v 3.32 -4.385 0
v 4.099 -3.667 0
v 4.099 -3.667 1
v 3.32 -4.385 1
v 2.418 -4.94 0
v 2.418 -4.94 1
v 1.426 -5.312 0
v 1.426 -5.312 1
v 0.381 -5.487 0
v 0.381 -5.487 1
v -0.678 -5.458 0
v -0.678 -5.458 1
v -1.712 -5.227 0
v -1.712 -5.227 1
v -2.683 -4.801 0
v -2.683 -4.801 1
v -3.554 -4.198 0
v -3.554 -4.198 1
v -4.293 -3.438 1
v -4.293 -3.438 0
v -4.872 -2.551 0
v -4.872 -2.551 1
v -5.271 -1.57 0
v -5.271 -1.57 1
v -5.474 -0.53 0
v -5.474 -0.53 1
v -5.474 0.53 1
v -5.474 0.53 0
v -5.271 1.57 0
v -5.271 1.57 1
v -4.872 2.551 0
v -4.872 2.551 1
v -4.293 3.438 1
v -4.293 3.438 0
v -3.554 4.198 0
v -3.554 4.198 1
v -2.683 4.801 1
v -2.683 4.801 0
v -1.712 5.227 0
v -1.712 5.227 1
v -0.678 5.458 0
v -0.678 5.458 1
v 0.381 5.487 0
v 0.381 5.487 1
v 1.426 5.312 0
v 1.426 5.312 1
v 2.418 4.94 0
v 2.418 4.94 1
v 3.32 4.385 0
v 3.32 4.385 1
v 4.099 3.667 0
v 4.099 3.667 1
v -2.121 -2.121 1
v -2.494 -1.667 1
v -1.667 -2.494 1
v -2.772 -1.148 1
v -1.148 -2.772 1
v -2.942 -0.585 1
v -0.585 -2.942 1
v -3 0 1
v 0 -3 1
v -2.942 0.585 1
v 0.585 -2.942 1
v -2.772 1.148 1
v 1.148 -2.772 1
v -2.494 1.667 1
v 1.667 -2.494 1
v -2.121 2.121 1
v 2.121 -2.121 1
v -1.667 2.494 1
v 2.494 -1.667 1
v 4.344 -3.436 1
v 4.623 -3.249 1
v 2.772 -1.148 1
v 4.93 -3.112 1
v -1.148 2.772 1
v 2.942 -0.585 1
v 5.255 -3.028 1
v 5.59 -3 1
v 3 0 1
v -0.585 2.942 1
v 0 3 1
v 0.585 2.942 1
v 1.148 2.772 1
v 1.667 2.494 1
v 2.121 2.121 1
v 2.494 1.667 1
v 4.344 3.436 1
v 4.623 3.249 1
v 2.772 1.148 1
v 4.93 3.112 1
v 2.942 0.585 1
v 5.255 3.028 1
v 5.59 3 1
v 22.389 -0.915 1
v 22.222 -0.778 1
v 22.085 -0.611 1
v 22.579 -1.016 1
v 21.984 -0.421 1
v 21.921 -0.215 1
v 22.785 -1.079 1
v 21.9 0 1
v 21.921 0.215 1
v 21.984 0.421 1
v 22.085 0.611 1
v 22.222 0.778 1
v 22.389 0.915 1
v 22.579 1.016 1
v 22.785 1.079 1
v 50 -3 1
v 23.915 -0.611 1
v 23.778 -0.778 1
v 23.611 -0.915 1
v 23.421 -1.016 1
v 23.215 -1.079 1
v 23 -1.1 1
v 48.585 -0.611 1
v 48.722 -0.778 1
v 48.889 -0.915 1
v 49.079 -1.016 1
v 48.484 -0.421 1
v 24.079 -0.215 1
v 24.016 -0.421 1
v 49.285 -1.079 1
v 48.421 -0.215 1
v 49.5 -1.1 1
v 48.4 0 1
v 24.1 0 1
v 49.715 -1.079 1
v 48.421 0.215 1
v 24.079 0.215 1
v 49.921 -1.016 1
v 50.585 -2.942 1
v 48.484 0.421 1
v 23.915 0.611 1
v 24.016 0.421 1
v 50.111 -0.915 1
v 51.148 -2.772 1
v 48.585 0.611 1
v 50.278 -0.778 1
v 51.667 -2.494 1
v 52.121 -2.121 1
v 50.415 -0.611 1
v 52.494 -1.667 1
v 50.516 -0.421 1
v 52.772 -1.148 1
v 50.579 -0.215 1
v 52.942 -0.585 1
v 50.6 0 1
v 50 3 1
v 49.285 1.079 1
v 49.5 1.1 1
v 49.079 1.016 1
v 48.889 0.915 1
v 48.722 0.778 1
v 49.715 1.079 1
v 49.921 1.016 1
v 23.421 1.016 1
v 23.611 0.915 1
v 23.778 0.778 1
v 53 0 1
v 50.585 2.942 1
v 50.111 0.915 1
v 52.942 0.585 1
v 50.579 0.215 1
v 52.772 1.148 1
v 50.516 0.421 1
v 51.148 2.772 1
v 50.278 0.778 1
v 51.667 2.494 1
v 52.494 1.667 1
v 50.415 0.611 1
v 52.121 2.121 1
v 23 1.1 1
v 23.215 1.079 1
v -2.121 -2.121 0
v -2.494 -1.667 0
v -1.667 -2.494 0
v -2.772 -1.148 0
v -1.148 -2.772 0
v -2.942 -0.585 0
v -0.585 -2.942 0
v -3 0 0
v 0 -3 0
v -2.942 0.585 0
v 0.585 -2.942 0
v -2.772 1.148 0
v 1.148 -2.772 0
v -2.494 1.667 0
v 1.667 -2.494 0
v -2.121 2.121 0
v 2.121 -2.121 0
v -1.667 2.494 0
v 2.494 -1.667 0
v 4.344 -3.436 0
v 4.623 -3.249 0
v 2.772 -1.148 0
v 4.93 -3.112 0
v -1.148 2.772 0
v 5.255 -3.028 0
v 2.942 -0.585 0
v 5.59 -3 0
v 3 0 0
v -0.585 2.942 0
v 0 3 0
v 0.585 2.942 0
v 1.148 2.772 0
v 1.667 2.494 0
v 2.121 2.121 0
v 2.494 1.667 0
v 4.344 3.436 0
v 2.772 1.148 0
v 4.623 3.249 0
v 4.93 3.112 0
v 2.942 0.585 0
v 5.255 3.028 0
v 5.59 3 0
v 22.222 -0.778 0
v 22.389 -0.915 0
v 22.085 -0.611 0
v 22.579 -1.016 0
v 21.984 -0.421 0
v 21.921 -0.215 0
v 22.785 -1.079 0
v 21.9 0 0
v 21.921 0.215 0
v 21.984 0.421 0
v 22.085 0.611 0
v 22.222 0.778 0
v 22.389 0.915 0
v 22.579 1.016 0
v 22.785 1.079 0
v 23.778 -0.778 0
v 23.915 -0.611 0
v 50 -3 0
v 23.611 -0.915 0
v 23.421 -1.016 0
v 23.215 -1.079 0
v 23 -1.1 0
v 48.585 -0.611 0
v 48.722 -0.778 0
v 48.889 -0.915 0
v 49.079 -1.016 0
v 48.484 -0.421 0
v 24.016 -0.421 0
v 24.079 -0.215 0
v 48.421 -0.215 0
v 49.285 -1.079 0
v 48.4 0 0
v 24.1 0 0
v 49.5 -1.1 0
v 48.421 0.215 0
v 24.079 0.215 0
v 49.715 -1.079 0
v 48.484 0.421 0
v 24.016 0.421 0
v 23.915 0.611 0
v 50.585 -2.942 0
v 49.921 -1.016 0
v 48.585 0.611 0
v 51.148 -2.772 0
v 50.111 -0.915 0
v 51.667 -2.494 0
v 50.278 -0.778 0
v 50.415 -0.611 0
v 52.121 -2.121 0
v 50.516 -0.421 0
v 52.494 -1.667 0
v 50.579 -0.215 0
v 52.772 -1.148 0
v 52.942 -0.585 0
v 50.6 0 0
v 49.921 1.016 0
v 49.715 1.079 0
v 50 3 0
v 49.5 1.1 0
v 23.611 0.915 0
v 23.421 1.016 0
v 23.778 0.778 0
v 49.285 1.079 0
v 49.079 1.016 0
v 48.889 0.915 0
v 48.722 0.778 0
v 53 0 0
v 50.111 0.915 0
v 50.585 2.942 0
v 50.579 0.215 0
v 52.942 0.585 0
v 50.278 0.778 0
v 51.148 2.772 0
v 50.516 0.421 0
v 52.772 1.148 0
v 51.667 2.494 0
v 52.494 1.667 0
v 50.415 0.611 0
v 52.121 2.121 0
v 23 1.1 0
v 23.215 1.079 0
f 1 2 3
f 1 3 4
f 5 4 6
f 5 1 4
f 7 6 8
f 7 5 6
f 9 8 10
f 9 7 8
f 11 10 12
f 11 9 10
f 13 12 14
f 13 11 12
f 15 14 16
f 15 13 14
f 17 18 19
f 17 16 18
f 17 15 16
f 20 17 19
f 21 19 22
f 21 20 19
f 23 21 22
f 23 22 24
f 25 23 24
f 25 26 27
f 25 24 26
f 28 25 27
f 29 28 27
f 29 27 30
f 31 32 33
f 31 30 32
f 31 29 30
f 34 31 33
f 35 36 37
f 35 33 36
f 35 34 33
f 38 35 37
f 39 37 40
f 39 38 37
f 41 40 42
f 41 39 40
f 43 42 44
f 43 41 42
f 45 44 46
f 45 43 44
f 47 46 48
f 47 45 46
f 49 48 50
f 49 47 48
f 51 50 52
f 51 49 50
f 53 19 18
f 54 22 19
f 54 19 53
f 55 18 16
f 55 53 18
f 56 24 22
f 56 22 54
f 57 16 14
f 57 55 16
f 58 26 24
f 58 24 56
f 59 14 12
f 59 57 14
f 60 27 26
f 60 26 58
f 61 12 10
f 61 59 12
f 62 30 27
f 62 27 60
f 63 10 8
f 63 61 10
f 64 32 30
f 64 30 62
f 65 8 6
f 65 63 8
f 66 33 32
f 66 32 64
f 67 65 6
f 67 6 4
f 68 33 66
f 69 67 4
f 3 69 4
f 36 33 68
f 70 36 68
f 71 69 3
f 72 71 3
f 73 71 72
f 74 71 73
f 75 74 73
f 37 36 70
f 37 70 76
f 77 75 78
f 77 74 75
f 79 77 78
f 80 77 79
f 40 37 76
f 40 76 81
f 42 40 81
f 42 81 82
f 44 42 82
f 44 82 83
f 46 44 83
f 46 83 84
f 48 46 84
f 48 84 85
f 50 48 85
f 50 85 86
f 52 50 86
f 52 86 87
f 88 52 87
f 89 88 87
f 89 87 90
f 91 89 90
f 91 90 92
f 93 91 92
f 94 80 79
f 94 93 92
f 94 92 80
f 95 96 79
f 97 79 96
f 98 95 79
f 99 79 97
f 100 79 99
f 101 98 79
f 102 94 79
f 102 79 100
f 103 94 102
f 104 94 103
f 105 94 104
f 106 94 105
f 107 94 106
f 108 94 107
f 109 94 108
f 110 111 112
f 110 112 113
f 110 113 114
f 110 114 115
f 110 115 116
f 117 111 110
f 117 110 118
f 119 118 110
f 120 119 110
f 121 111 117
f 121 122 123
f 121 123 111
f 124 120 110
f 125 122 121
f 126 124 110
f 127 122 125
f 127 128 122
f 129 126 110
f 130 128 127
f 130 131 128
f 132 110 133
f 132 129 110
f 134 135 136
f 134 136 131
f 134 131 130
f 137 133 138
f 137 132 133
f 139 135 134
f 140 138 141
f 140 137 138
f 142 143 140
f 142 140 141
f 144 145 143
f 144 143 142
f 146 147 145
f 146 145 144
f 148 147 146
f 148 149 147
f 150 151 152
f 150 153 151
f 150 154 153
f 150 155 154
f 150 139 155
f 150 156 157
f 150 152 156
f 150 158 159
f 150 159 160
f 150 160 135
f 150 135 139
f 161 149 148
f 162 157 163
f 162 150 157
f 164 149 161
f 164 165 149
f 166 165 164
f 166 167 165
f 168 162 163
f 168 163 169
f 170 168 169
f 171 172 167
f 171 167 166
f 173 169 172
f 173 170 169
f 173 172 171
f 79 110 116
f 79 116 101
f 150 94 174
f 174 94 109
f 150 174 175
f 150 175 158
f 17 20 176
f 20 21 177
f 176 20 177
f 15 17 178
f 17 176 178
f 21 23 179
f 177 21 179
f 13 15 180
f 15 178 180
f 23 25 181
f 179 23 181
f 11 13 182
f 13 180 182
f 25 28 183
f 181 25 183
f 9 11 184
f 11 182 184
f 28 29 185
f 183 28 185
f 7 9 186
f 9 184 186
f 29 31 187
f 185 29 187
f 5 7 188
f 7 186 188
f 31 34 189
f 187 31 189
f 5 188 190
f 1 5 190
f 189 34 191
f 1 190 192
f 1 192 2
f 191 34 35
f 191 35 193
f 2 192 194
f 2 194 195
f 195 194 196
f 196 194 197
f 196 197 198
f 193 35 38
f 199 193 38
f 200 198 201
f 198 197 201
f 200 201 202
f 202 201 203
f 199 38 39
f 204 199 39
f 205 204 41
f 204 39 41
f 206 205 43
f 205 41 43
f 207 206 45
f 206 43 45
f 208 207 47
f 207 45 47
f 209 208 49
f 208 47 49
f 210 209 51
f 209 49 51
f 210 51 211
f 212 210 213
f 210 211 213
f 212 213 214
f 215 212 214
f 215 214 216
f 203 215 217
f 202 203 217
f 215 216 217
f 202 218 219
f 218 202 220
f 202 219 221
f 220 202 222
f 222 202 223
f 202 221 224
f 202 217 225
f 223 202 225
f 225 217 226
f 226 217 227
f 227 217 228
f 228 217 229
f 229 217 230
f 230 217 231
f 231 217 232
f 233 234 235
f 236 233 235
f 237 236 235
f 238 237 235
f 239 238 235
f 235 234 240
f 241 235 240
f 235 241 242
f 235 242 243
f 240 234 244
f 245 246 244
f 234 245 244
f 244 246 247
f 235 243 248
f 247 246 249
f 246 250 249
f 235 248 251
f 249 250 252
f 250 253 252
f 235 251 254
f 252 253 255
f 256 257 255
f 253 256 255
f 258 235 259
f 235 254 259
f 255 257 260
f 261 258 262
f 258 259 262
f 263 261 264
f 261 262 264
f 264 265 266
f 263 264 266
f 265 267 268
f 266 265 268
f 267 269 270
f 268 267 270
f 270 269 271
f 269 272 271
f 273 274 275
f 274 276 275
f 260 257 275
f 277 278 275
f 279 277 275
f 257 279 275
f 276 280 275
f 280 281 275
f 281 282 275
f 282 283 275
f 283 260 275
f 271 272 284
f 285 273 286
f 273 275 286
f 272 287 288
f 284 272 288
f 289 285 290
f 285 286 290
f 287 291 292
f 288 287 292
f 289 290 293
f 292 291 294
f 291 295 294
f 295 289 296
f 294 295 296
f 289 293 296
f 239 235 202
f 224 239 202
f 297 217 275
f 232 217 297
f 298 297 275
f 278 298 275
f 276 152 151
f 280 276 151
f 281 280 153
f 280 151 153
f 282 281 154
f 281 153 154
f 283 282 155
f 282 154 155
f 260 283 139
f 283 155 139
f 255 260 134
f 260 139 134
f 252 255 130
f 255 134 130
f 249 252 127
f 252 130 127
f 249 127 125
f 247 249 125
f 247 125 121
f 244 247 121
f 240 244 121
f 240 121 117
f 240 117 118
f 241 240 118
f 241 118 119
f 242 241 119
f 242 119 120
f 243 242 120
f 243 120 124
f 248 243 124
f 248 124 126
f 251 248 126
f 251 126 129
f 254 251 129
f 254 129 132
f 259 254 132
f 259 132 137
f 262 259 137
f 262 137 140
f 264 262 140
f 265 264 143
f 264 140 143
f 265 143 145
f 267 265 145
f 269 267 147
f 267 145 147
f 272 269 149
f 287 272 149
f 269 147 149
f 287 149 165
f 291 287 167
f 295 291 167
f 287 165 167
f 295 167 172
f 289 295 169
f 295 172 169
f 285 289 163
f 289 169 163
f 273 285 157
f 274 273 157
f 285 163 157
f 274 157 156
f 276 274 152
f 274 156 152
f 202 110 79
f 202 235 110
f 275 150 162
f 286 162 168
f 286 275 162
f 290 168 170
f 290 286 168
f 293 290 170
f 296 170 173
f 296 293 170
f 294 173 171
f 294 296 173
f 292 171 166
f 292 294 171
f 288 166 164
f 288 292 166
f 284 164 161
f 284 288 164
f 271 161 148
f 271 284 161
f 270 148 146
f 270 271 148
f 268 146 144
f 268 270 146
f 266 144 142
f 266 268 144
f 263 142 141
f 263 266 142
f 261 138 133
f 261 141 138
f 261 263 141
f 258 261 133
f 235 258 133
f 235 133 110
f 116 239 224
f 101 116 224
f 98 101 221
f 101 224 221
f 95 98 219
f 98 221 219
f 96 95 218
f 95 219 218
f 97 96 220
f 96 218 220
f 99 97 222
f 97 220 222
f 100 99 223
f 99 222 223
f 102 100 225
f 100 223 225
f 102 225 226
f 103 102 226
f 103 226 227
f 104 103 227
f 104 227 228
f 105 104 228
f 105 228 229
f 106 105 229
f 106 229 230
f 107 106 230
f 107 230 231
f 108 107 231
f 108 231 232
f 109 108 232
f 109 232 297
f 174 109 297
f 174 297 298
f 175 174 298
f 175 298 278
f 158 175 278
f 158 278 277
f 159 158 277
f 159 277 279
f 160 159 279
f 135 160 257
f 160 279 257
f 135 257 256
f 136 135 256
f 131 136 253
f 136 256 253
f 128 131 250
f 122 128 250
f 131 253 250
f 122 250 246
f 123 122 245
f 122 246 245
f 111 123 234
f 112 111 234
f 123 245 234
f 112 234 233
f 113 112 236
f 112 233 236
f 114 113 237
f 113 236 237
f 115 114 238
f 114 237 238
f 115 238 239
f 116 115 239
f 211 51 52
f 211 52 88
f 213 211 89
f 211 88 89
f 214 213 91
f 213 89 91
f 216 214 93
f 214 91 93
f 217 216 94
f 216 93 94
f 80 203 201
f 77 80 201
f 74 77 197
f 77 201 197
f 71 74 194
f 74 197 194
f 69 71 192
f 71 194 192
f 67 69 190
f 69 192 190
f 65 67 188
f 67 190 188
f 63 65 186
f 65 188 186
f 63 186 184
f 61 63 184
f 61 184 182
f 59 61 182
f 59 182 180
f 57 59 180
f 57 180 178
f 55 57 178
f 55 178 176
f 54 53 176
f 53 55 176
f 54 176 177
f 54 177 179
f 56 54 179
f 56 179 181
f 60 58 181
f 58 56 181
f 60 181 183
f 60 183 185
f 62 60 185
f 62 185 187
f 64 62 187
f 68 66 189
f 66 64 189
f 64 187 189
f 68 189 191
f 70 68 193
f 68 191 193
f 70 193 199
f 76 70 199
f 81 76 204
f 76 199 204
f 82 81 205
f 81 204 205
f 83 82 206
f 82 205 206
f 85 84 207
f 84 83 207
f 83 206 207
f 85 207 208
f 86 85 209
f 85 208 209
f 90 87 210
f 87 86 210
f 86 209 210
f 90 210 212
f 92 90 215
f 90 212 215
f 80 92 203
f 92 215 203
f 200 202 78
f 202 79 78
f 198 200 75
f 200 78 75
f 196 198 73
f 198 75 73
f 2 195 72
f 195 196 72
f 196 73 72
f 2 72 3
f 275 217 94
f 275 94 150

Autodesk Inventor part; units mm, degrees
ref_plane "YZ Plane" through (0, 0, 0) normal (1, 0, 0) x (0, 1, 0)
ref_plane "XZ Plane" through (0, 0, 0) normal (0, 1, 0) x (-1, 0, 0)
ref_plane "XY Plane" through (0, 0, 0) normal (0, 0, 1) x (1, 0, 0)
sketch "Skizze1" plane through (0, 0, 0) normal (0, 0, 1) x (1, 0, 0)
  line L0 (0, 0) -> (38.7995, 0) construction
  arc A0 (4.6098, 3) -> (4.6098, -3) centre (0, 0) ccw
  circle A1 centre (0, 0) radius 3
  line L1 (4.6098, 3) -> (4.6098, -3)
  line L2 (4.6098, 3) -> (50, 3)
  line L3 (53, 0) -> (53, 0)
  line L4 (50, -3) -> (4.6098, -3)
  arc A2 (53, 0) -> (50, 3) centre (50, 0) ccw
  arc A3 (50, -3) -> (53, 0) centre (50, 0) ccw
  point P0 (53, 0)
  dimension "d1" = 6
  dimension "d4" = 6
  dimension "d5" = 5.5
  dimension "d6" = 3
  dimension "d7" = 50
extrude "Extrusion1" add sketch "Skizze1" along normal blind 1
fillet "Rundung1" radius 2 2 edges at (4.6098, 3, 0.5) (4.6098, -3, 0.5)
sketch "Skizze3" plane through (0, 0, 0) normal (0, 0, -1) x (-1, 0, 0)
  point P0 (0, 0)
  point P1 (-49.5, 0)
  dimension "d26" = 49.5
hole "Bohrung2" at (49.5, 0, 0) direction (0, 0, 1) diameter 2.2 depth 1
sketch "Skizze2" plane through (0, 0, 1) normal (0, 0, 1) x (1, 0, 0)
  point P0 (0, 0)
  point P1 (23, 0)
  dimension "d18" = 23
hole "Bohrung1" at (23, 0, 1) direction (0, 0, -1) diameter 2.2 depth 1
properties part number "pleuel" material "Edelstahl, 440C"
